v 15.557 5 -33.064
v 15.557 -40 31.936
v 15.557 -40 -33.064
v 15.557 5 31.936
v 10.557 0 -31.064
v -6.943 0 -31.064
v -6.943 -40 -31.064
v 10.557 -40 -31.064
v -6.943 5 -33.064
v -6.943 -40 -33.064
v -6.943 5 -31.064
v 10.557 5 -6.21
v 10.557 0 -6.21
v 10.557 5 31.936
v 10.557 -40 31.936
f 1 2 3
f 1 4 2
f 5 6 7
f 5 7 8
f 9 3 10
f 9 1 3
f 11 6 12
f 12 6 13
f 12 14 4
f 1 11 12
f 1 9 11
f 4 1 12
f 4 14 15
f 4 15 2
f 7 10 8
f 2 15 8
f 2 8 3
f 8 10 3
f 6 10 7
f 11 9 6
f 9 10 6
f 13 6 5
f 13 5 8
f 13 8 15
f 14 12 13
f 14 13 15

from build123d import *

# Parameters (mm, degrees)
BOSS_EXTRUDE1_DEPTH = 5
BOSS_EXTRUDE2_DEPTH = 40


with BuildPart() as part:
    # Sketch1 → Boss-Extrude1 (new body)
    with BuildSketch(Plane(origin=(0, 0, 0), x_dir=(1, 0, 0), z_dir=(0, 1, 0))):
        Polygon((15.55671577, -31.935616946), (15.55671577, 33.064383054), (-6.94328423, 33.064383054), (-6.94328423, 31.064383054), (10.55671577, 6.210249778), (10.55671577, -31.935616946), align=None)
    extrude(amount=BOSS_EXTRUDE1_DEPTH)

    # Sketch1<3> → Boss-Extrude2 (add)
    with BuildSketch(Plane(origin=(0, 0, 0), x_dir=(1, 0, 0), z_dir=(0, 1, 0))):
        Polygon((15.55671577, -31.935616946), (15.55671577, 33.064383054), (-6.94328423, 33.064383054), (-6.94328423, 31.064383054), (10.55671577, 31.064383054), (10.55671577, 6.210249778), (10.55671577, -31.935616946), align=None)
    extrude(amount=-BOSS_EXTRUDE2_DEPTH)


solid = part.part
